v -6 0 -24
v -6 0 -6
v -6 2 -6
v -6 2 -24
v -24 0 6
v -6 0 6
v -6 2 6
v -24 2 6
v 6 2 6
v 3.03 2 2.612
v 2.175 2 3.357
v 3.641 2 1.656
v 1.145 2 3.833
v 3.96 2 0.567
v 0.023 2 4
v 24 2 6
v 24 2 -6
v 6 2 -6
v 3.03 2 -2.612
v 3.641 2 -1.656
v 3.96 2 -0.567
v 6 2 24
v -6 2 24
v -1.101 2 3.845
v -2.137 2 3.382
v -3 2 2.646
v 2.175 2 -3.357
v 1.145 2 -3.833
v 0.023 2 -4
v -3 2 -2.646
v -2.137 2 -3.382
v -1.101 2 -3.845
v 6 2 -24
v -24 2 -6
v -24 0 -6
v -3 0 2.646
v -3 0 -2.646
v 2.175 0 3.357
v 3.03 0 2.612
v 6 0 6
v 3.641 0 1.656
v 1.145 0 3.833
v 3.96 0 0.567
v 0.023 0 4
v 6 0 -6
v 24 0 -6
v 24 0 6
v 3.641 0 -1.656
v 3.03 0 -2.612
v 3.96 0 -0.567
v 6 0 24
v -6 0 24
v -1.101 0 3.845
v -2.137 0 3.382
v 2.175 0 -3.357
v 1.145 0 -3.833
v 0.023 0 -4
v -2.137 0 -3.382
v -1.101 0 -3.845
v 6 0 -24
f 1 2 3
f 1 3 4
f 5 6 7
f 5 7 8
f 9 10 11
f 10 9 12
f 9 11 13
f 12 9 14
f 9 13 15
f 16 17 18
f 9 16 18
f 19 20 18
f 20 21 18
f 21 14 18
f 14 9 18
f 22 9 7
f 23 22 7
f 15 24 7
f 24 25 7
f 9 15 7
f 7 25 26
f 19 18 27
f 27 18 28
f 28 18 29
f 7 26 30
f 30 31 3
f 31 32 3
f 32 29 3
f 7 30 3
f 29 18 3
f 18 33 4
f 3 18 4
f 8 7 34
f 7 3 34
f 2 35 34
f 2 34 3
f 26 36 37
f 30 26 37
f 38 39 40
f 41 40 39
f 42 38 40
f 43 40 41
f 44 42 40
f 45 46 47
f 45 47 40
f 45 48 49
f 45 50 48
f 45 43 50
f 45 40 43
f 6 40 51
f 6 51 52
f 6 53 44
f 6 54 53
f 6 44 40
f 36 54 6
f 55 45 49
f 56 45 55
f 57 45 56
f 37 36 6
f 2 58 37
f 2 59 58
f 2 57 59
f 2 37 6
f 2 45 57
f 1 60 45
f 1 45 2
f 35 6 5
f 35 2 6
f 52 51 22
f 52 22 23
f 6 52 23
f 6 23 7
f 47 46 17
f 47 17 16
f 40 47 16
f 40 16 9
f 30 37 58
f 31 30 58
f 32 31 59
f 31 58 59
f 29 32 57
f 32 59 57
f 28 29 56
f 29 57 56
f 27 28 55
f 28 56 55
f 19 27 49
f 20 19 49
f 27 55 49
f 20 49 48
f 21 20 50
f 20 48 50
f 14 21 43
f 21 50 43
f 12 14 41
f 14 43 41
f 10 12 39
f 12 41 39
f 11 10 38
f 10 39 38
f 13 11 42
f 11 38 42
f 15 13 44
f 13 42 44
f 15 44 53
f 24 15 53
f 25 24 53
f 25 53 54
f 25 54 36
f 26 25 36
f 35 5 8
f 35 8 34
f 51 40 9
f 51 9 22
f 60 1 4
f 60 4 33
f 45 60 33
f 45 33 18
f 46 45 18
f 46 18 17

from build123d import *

# Parameters (mm, degrees)
BOSS_EXTRUDE1_DEPTH = 2
CUT_EXTRUDE2_DEPTH  = 35


with BuildPart() as part:
    # Sketch1 → Boss-Extrude1 (new body)
    with BuildSketch(Plane(origin=(0, 0, 0), x_dir=(1, 0, 0), z_dir=(0, 1, 0))):
        Polygon((-6, 6), (-6, 24), (6, 24), (6, 6), (24, 6), (24, -6), (6, -6), (6, -24), (-6, -24), (-6, -6), (-24, -6), (-24, 6), align=None)
    extrude(amount=BOSS_EXTRUDE1_DEPTH)

    # Sketch2 → Cut-Extrude2 (cut, through all)
    with BuildSketch(Plane(origin=(0, 0, 0), x_dir=(1, 0, 0), z_dir=(0, 1, 0))):
        with BuildLine():
            Line((-3, -2.645751311), (-3, 2.645751311))
            ThreePointArc((-3, 2.645751311), (4, 0), (-3, -2.645751311))
        make_face()
    extrude(amount=CUT_EXTRUDE2_DEPTH, mode=Mode.SUBTRACT)


solid = part.part
